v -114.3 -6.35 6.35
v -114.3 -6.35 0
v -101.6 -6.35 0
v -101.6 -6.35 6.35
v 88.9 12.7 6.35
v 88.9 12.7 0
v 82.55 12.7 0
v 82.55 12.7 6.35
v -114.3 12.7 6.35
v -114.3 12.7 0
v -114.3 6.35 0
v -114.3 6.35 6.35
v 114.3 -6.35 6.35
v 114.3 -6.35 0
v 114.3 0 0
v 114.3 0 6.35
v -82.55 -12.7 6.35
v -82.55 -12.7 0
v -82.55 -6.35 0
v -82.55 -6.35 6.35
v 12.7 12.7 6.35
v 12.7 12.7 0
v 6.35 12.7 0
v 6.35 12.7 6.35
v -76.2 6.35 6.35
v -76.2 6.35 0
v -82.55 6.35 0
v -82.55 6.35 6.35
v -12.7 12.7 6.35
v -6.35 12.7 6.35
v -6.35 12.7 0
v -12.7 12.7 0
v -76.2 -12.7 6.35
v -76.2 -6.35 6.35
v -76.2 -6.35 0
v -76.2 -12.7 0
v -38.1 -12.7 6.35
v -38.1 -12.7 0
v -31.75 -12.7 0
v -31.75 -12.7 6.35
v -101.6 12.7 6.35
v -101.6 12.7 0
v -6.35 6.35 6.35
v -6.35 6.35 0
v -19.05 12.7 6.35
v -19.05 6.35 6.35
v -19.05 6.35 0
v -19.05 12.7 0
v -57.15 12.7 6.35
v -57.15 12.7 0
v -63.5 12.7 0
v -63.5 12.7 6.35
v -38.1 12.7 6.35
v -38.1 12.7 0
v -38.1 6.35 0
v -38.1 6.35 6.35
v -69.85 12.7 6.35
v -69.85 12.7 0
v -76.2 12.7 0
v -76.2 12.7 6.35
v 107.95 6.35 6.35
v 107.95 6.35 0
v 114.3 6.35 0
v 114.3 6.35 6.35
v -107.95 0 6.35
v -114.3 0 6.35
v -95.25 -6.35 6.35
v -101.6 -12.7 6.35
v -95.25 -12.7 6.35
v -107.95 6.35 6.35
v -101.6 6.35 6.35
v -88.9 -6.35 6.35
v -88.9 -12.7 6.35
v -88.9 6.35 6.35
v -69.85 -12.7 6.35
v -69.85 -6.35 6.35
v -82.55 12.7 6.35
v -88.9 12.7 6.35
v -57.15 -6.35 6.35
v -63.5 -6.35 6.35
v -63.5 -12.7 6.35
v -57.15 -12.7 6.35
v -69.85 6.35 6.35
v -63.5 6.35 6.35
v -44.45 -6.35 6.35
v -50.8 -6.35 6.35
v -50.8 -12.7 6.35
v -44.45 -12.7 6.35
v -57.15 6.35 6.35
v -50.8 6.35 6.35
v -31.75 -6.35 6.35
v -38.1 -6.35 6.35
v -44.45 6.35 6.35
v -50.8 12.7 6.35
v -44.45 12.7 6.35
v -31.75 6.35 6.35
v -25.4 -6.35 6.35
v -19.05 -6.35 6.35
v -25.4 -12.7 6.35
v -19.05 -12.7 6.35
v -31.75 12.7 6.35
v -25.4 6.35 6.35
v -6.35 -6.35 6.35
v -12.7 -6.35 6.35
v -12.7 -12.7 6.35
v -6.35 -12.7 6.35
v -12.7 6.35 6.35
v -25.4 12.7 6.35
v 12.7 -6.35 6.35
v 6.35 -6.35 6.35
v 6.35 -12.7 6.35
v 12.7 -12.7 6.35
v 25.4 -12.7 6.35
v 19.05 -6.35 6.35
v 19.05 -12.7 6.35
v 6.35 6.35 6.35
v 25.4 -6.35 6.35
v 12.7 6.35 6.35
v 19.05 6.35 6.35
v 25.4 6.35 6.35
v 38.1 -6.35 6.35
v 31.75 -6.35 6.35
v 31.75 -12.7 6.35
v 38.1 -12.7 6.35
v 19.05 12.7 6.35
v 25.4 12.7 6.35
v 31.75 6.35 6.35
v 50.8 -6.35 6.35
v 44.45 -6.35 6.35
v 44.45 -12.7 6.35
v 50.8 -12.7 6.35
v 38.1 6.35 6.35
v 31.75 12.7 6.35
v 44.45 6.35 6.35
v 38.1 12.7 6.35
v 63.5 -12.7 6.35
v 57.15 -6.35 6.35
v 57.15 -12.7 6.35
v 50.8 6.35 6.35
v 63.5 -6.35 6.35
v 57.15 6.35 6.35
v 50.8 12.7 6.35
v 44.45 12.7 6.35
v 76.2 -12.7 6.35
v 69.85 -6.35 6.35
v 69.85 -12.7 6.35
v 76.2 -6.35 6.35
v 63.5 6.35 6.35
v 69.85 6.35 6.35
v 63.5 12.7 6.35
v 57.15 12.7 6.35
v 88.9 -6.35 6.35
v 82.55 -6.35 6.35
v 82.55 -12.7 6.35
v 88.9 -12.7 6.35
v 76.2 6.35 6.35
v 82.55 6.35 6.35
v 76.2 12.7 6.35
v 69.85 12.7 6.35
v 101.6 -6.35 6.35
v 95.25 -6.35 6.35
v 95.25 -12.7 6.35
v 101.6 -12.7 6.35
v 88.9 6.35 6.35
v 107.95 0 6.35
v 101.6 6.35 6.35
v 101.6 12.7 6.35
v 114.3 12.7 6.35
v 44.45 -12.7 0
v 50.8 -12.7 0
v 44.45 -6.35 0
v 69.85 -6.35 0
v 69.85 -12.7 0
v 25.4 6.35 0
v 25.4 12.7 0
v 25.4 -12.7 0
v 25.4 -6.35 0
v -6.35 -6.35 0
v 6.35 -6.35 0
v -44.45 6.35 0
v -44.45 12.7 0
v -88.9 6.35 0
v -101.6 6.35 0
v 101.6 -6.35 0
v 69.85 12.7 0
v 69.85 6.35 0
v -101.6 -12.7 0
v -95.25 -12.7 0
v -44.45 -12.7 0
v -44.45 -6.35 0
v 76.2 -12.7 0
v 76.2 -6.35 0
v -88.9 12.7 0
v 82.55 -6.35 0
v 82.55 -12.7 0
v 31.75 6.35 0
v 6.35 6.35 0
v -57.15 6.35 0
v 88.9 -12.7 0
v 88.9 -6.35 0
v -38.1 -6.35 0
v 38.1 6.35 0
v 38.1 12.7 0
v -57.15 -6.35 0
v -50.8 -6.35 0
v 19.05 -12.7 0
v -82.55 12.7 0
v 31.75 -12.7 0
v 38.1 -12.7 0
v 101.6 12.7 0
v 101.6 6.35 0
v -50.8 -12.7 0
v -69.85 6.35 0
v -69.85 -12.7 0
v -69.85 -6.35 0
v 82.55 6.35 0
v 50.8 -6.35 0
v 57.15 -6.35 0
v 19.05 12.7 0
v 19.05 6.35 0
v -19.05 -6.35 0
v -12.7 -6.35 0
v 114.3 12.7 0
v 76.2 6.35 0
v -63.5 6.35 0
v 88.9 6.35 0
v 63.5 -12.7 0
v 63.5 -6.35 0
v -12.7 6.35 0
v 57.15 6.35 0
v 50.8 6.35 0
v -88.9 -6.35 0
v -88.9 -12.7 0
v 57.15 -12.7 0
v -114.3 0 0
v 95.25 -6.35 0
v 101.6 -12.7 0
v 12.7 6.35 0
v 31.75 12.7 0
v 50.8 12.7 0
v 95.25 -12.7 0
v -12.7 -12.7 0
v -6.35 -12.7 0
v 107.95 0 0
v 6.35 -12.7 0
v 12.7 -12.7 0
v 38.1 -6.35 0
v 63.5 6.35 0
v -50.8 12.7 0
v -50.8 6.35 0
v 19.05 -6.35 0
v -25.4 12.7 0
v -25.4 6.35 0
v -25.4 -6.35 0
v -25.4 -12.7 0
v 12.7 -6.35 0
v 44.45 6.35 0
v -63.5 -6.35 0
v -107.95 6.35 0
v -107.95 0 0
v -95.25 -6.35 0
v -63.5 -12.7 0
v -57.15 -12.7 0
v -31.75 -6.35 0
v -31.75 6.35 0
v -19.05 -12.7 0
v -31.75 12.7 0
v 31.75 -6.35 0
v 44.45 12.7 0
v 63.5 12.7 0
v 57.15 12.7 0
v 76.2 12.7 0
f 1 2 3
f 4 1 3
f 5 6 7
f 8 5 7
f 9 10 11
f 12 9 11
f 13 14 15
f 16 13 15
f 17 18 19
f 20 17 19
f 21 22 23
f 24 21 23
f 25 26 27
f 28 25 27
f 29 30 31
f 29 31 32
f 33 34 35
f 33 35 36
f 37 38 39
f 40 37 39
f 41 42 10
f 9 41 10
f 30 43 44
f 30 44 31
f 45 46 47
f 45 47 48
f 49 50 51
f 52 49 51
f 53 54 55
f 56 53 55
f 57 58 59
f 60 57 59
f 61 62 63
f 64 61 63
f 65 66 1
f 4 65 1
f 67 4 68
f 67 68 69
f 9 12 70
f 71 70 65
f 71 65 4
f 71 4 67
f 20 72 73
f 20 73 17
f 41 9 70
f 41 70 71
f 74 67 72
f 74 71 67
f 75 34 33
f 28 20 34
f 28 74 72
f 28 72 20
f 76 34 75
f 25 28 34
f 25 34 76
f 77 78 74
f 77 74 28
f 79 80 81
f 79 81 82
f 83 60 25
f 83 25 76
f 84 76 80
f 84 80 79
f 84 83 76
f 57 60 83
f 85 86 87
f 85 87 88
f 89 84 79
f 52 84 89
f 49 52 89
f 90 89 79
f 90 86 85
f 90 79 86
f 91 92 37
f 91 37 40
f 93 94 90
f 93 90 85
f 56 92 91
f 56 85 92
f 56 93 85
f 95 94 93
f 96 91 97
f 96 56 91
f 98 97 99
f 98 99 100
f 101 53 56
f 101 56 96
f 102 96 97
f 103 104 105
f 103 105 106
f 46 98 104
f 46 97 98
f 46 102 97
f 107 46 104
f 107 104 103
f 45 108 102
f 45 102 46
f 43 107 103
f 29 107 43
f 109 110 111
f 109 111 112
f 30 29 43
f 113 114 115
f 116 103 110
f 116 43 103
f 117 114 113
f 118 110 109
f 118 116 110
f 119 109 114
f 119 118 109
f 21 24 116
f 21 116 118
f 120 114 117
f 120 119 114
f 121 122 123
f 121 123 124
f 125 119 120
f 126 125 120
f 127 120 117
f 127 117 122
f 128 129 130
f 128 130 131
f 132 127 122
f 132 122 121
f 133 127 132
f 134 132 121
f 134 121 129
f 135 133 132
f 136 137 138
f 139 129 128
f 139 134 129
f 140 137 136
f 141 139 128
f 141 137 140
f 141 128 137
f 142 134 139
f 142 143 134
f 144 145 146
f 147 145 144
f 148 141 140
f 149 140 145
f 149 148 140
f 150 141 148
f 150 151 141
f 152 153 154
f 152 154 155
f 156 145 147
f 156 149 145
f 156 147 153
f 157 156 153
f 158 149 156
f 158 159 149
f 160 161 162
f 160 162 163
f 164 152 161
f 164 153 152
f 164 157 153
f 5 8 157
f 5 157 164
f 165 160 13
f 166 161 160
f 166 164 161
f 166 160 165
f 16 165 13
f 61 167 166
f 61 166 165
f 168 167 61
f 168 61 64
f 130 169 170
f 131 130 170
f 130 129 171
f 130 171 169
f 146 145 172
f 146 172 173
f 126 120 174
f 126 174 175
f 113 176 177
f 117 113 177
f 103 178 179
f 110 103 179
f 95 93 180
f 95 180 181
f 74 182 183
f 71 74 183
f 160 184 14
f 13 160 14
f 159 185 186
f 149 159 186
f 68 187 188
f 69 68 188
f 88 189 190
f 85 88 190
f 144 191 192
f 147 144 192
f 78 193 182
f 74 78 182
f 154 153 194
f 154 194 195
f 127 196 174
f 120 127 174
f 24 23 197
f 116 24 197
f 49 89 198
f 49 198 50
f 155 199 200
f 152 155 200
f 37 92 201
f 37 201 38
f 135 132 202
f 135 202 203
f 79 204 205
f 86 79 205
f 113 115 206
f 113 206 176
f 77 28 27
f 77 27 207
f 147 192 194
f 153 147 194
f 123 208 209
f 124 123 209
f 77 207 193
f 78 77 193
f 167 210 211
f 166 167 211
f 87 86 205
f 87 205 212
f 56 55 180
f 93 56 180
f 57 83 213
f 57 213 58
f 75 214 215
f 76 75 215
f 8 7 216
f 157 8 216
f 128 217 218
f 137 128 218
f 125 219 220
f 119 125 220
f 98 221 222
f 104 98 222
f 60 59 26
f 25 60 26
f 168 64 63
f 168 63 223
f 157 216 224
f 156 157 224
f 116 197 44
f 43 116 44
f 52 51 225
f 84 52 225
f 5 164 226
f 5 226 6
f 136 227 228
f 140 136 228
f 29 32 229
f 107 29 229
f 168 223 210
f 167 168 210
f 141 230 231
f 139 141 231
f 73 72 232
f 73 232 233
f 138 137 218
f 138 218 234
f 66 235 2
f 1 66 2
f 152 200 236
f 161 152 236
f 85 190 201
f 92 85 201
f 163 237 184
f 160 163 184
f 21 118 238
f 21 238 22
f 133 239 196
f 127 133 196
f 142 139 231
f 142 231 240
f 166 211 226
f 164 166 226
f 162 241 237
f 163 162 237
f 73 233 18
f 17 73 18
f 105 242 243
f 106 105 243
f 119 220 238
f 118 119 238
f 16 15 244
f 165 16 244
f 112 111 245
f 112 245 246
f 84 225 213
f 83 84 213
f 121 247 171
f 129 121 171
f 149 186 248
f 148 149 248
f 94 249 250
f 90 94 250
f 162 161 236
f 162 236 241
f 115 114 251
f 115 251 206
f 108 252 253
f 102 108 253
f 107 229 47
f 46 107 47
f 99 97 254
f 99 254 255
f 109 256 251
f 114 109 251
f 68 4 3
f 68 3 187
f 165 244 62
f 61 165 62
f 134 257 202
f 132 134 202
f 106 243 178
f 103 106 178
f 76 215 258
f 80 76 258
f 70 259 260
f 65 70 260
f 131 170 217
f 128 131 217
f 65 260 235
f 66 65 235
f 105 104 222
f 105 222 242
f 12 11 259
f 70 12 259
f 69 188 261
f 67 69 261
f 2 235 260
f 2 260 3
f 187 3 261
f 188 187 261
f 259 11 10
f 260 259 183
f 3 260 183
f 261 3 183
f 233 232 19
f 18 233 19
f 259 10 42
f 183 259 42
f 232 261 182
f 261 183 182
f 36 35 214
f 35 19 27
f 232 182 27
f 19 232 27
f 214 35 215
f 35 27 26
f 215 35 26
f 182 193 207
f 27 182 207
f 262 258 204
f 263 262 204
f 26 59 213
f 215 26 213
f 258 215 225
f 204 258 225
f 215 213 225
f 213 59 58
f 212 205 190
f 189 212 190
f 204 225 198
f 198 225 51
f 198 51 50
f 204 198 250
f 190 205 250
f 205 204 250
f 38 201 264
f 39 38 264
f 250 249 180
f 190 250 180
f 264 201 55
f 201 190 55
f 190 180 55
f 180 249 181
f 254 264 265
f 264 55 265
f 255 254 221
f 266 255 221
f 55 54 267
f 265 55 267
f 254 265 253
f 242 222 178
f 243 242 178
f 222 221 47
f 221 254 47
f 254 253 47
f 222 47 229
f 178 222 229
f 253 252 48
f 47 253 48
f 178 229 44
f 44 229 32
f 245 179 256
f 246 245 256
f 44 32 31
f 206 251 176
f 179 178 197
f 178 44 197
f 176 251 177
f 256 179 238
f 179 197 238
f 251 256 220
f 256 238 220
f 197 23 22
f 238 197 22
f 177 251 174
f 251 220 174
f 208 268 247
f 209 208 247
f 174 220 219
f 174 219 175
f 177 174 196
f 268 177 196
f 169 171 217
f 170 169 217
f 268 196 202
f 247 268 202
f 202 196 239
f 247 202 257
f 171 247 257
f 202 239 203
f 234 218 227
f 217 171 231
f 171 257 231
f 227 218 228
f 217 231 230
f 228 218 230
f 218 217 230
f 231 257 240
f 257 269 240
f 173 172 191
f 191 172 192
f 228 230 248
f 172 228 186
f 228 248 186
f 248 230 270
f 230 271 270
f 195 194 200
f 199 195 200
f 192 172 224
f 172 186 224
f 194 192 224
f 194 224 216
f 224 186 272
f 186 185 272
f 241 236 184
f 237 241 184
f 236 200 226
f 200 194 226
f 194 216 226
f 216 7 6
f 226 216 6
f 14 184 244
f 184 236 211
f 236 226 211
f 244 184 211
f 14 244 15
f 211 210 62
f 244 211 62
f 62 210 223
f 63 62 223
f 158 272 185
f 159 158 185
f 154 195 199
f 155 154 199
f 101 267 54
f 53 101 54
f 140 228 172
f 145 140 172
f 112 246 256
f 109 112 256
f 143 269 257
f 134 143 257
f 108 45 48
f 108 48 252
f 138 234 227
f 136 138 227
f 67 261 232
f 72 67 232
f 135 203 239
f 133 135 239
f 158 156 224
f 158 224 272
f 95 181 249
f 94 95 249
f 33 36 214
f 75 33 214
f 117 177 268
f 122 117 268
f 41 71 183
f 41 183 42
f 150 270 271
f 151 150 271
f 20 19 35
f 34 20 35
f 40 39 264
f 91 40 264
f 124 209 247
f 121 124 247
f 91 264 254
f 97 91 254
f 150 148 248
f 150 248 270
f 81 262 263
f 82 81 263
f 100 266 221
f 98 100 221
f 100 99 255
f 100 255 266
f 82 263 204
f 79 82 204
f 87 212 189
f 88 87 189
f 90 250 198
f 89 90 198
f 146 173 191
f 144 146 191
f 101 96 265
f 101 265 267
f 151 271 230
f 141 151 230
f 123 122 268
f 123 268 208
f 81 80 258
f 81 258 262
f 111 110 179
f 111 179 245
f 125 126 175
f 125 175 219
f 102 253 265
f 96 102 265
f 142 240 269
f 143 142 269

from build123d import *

# Parameters (mm, degrees)
BOSS_EXTRUDE1_DEPTH = 6.35


with BuildPart() as part:
    # Sketch1 → Boss-Extrude1 (new body)
    with BuildSketch(Plane.XY):
        Polygon((-107.95, 0), (-114.3, 0), (-114.3, -6.35), (-101.6, -6.35), (-101.6, -12.7), (-95.25, -12.7), (-95.25, -6.35), (-88.9, -6.35), (-88.9, -12.7), (-82.55, -12.7), (-82.55, -6.35), (-76.2, -6.35), (-76.2, -12.7), (-69.85, -12.7), (-69.85, -6.35), (-63.5, -6.35), (-63.5, -12.7), (-57.15, -12.7), (-57.15, -6.35), (-50.8, -6.35), (-50.8, -12.7), (-44.45, -12.7), (-44.45, -6.35), (-38.1, -6.35), (-38.1, -12.7), (-31.75, -12.7), (-31.75, -6.35), (-25.4, -6.35), (-25.4, -12.7), (-19.05, -12.7), (-19.05, -6.35), (-12.7, -6.35), (-12.7, -12.7), (-6.35, -12.7), (-6.35, -6.35), (0, -6.35), (6.35, -6.35), (6.35, -12.7), (12.7, -12.7), (12.7, -6.35), (19.05, -6.35), (19.05, -12.7), (25.4, -12.7), (25.4, -6.35), (31.75, -6.35), (31.75, -12.7), (38.1, -12.7), (38.1, -6.35), (44.45, -6.35), (44.45, -12.7), (50.8, -12.7), (50.8, -6.35), (57.15, -6.35), (57.15, -12.7), (63.5, -12.7), (63.5, -6.35), (69.85, -6.35), (69.85, -12.7), (76.2, -12.7), (76.2, -6.35), (82.55, -6.35), (82.55, -12.7), (88.9, -12.7), (88.9, -6.35), (95.25, -6.35), (95.25, -12.7), (101.6, -12.7), (101.6, -6.35), (114.3, -6.35), (114.3, 0), (107.95, 0), (107.95, 6.35), (114.3, 6.35), (114.3, 12.7), (107.95, 12.7), (101.6, 12.7), (101.6, 6.35), (95.25, 6.35), (88.9, 6.35), (88.9, 12.7), (82.55, 12.7), (82.55, 6.35), (76.2, 6.35), (76.2, 12.7), (69.85, 12.7), (69.85, 6.35), (63.5, 6.35), (63.5, 12.7), (57.15, 12.7), (57.15, 6.35), (50.8, 6.35), (50.8, 12.7), (44.45, 12.7), (44.45, 6.35), (38.1, 6.35), (38.1, 12.7), (31.75, 12.7), (31.75, 6.35), (25.4, 6.35), (25.4, 12.7), (19.05, 12.7), (19.05, 6.35), (12.7, 6.35), (12.7, 12.7), (6.35, 12.7), (6.35, 6.35), (0, 6.35), (-6.35, 6.35), (-6.35, 12.7), (-12.7, 12.7), (-12.7, 6.35), (-19.05, 6.35), (-19.05, 12.7), (-25.4, 12.7), (-25.4, 6.35), (-31.75, 6.35), (-31.75, 12.7), (-38.1, 12.7), (-38.1, 6.35), (-44.45, 6.35), (-44.45, 12.7), (-50.8, 12.7), (-50.8, 6.35), (-57.15, 6.35), (-57.15, 12.7), (-63.5, 12.7), (-63.5, 6.35), (-69.85, 6.35), (-69.85, 12.7), (-76.2, 12.7), (-76.2, 6.35), (-82.55, 6.35), (-82.55, 12.7), (-88.9, 12.7), (-88.9, 6.35), (-95.25, 6.35), (-101.6, 6.35), (-101.6, 12.7), (-107.95, 12.7), (-114.3, 12.7), (-114.3, 6.35), (-107.95, 6.35), align=None)
    extrude(amount=BOSS_EXTRUDE1_DEPTH)


solid = part.part
